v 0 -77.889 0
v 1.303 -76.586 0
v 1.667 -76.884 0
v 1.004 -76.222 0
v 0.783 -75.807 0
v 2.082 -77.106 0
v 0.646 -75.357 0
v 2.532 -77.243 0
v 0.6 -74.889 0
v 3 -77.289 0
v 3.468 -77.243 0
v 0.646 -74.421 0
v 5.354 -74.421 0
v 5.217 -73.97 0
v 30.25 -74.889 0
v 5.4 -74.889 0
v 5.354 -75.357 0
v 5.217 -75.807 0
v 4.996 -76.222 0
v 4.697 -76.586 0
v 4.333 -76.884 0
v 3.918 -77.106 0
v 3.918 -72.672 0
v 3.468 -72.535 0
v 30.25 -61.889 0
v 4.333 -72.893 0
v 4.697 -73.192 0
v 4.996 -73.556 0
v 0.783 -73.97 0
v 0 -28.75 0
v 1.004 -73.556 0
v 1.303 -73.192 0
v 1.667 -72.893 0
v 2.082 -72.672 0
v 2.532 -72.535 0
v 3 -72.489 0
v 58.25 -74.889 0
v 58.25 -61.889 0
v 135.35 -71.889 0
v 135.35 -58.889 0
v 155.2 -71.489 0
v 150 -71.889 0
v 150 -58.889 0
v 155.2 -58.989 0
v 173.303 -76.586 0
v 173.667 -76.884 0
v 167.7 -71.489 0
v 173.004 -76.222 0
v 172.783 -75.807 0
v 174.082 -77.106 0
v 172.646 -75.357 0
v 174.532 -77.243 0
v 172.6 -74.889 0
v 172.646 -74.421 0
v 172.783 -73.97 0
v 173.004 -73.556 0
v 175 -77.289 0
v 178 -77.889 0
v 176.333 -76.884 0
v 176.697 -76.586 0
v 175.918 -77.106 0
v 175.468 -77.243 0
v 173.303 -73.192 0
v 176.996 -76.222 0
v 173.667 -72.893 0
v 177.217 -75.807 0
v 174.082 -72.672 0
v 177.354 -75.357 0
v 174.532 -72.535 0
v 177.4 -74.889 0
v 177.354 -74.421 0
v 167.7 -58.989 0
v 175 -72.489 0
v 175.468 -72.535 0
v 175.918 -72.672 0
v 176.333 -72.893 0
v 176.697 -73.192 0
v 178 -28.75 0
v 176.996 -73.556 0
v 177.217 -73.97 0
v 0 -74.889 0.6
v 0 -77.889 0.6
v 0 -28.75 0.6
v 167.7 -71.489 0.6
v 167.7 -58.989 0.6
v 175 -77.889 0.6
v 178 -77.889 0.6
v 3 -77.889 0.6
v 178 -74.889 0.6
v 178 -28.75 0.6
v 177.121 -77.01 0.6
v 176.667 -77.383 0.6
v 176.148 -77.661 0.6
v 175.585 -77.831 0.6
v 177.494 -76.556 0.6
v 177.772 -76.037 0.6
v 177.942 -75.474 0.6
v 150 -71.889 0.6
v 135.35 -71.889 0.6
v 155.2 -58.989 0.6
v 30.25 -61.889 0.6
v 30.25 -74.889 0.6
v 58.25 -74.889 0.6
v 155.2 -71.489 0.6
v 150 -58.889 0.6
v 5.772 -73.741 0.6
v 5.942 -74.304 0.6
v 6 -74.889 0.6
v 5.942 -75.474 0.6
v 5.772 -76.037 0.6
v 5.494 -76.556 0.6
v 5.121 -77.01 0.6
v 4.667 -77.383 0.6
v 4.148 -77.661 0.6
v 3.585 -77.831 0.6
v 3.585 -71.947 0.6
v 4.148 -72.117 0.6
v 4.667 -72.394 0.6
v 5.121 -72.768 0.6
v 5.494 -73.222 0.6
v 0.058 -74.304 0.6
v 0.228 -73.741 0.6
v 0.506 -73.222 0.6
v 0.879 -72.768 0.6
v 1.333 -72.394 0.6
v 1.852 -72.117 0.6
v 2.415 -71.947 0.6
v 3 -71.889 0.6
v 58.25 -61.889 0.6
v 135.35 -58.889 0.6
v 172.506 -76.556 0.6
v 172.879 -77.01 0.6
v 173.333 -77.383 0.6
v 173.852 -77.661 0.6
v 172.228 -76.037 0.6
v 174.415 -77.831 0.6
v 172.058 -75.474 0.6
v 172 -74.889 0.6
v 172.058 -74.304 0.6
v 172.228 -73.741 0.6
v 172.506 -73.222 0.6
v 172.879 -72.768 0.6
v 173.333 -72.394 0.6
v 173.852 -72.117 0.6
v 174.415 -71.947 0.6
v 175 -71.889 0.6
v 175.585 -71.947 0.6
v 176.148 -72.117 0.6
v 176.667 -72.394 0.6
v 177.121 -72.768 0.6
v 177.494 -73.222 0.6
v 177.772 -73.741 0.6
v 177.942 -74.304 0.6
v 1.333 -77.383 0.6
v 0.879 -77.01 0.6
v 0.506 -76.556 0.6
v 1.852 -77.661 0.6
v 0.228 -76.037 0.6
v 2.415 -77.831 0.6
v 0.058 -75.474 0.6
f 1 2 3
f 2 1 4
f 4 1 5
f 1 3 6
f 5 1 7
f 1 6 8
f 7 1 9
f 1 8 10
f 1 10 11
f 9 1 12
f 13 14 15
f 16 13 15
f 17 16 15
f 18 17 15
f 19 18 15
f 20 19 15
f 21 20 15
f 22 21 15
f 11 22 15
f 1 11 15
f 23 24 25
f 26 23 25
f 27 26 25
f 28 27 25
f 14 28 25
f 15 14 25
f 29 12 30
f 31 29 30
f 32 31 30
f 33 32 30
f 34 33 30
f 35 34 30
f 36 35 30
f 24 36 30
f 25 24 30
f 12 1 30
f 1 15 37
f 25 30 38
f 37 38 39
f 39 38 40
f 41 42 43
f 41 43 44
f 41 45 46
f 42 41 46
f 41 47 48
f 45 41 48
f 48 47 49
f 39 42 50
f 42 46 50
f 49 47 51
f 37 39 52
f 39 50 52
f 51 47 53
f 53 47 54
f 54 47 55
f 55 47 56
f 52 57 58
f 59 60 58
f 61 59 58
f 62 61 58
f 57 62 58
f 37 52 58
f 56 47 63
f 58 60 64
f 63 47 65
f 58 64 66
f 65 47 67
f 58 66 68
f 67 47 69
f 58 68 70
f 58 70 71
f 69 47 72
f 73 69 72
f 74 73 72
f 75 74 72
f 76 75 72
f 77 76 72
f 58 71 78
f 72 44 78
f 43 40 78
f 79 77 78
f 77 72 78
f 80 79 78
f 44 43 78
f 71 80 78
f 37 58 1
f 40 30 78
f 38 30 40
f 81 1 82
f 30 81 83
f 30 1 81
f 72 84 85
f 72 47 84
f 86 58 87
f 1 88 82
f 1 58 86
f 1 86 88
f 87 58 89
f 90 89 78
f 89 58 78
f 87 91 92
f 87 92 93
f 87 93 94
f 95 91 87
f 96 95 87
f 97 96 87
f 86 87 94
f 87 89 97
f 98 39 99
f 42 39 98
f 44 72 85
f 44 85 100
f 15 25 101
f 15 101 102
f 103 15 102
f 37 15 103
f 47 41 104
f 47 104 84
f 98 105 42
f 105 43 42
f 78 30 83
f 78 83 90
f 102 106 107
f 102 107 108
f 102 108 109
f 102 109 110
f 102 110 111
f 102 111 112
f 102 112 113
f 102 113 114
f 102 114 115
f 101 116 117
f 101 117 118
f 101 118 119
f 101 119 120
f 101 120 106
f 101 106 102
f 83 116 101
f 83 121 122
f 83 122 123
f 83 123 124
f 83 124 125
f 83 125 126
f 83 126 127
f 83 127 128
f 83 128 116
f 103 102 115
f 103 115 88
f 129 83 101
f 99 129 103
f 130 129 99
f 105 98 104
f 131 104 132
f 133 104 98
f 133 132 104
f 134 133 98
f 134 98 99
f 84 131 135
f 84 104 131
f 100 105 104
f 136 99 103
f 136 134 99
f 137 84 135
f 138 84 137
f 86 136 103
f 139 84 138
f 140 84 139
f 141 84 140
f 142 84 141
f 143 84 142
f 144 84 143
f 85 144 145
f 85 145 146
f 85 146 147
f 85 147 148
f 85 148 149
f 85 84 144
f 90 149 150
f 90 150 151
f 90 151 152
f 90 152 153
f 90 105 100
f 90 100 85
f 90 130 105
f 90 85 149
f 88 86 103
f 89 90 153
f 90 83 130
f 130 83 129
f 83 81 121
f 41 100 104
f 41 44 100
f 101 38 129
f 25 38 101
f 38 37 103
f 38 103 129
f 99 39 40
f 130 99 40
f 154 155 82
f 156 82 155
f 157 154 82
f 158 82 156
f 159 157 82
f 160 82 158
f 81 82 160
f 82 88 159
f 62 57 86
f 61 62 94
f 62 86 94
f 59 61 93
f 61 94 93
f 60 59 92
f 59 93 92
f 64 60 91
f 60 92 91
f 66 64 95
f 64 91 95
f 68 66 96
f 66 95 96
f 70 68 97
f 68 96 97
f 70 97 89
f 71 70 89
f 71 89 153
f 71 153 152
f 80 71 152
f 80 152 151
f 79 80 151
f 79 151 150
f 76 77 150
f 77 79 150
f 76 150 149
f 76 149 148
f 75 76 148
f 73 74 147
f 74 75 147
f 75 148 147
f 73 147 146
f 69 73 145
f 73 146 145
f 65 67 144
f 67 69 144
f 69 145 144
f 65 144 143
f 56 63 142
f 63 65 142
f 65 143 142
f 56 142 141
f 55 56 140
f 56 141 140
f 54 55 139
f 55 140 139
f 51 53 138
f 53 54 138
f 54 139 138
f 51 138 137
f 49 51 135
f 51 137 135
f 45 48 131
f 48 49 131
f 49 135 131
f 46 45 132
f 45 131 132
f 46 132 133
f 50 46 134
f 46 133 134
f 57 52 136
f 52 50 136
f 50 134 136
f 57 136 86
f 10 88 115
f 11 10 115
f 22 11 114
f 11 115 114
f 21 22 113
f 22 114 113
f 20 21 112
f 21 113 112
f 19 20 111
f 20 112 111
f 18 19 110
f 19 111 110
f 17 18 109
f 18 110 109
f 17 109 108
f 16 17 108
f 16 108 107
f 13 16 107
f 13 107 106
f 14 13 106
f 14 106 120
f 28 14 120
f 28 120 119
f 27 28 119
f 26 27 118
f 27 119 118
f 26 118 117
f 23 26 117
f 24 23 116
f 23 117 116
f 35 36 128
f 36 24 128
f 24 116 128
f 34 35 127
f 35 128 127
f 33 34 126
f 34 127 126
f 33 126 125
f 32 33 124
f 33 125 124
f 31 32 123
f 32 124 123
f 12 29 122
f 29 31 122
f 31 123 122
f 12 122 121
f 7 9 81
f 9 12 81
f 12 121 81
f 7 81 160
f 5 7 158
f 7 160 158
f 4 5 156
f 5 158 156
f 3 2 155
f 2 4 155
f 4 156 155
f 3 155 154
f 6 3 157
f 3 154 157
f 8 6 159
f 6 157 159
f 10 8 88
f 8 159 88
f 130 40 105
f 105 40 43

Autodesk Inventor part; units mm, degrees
ref_plane "YZ Plane" through (0, 0, 0) normal (1, 0, 0) x (0, 1, 0)
ref_plane "XZ Plane" through (0, 0, 0) normal (0, 1, 0) x (-1, 0, 0)
ref_plane "XY Plane" through (0, 0, 0) normal (0, 0, 1) x (1, 0, 0)
ref_plane "Work Plane1" through (0, 0, 0) normal (0, 0, 1) x (1, 0, 0)
sketch "Sketch1" plane through (0, 0, 0) normal (0, 0, 1) x (1, 0, 0)
  line L0 (84.5, 12.4325) -> (84.5, -11.5675) projected
  line L1 (84.5, -11.5675) -> (72.5, -11.5675) projected
  line L2 (72.5, -11.5675) -> (72.5, 4.5875) projected
  circle A0 centre (69.5, 4.5875) radius 3 projected
  line L3 (72.5, 4.5875) -> (72.5, 12.4325) projected
  line L4 (72.5, 12.4325) -> (84.5, 12.4325) projected
  arc A1 (105.5, 4.2836) -> (105.5, 4.8914) centre (108.4846, 4.5875) ccw projected
  line L5 (105.5, 4.2836) -> (105.5, -11.5675) projected
  line L6 (105.5, -11.5675) -> (93.5, -11.5675) projected
  line L7 (93.5, -11.5675) -> (93.5, 12.4325) projected
  line L8 (93.5, 12.4325) -> (105.5, 12.4325) projected
  line L9 (105.5, 12.4325) -> (105.5, 4.8914) projected
  circle A2 centre (108.4462, 27.5) radius 3 projected
  circle A3 centre (69.5, 27.5) radius 3 projected
  circle A4 centre (89, 0.9661) radius 3 projected
  circle A5 centre (89, 29.5) radius 3 projected
  arc A6 (175, 0) -> (178, -3) centre (175, -3) ccw projected
  line L10 (175, 0) -> (115.0397, 0) projected
  line L11 (65.5, 33.8) -> (65.5, 0) projected
  line L12 (65.5, 0) -> (65.1397, 0) projected
  arc A7 (0, -3) -> (3, 0) centre (3, -3) ccw projected
  line L13 (0, -3) -> (0, -25.75) projected
  arc A8 (3, -28.75) -> (0, -25.75) centre (3, -25.75) ccw projected
  line L14 (3, -28.75) -> (62.9603, -28.75) projected
  arc A9 (178, -25.75) -> (175, -28.75) centre (175, -25.75) ccw projected
  line L15 (178, -25.75) -> (178, -3) projected
  circle A10 centre (3, -25.75) radius 2.3 projected
  circle A11 centre (3, -3) radius 2.3 projected
  circle A12 centre (3, -74.8889) radius 2.3 projected
  line L16 (0, 0) -> (6, 0) projected
  line L17 (0, -77.8889) -> (0, 0) projected
  line L18 (0, -77.8889) -> (6, -77.8889) projected
  line L19 (6, -71.8889) -> (6, -77.8889) projected
  line L20 (6, -71.8889) -> (1.6, -71.8889) projected
  line L21 (1.6, -71.8889) -> (1.6, -56.7889) projected
  line L22 (1.6, -56.7889) -> (3, -56.7889) projected
  line L23 (3, -28.75) -> (3, -56.7889) projected
  line L24 (3, -28.75) -> (6, -28.75) projected
  line L25 (6, -28.75) -> (6, -22.75) projected
  line L26 (6, -22.75) -> (3, -22.75) projected
  line L27 (3, -6) -> (3, -22.75) projected
  line L28 (3, -6) -> (6, -6) projected
  line L29 (6, -6) -> (6, 0) projected
  circle A13 centre (175, -3) radius 2.3 projected
  circle A14 centre (175, -25.75) radius 2.3 projected
  line L30 (175, -28.75) -> (175, -71.8889) projected
  line L31 (175, -6) -> (175, -22.75) projected
  line L32 (175, -71.8889) -> (172, -71.8889) projected
  line L33 (172, -71.8889) -> (172, -77.8889) projected
  line L34 (178, -77.8889) -> (172, -77.8889) projected
  line L35 (178, -77.8889) -> (178, 0) projected
  line L36 (178, 0) -> (172, 0) projected
  line L37 (172, 0) -> (172, -6) projected
  line L38 (172, -6) -> (175, -6) projected
  line L39 (175, -22.75) -> (172, -22.75) projected
  line L40 (172, -22.75) -> (172, -28.75) projected
  line L41 (172, -28.75) -> (175, -28.75) projected
  circle A15 centre (175, -74.8889) radius 2.3 projected
  line L42 (156.2, -70.4889) -> (156.2, -59.9889) projected
  line L43 (166.7, -59.9889) -> (156.2, -59.9889) projected
  line L44 (166.7, -59.9889) -> (166.7, -70.4889) projected
  line L45 (156.2, -70.4889) -> (166.7, -70.4889) projected
  line L46 (149, -59.8889) -> (149, -70.8889) projected
  line L47 (149, -70.8889) -> (136.35, -70.8889) projected
  line L48 (136.35, -70.8889) -> (136.35, -59.8889) projected
  line L49 (136.35, -59.8889) -> (149, -59.8889) projected
  line L50 (135, -53.8889) -> (135, -71.8889) projected
  line L51 (135, -71.8889) -> (175, -71.8889) projected
  line L52 (175, -71.8889) -> (175, -53.8889) projected
  line L53 (175, -53.8889) -> (135, -53.8889) projected
  circle A16 centre (137.85, -56.7389) radius 1.5 projected
  circle A17 centre (172.15, -56.7389) radius 1.5 projected
  line L54 (31.25, -62.8889) -> (31.25, -73.8889) projected
  line L55 (31.25, -73.8889) -> (57.25, -73.8889) projected
  line L56 (57.25, -73.8889) -> (57.25, -62.8889) projected
  line L57 (57.25, -62.8889) -> (31.25, -62.8889) projected
  line L58 (3, -56.7889) -> (23.3, -56.7889) projected
  line L59 (23.3, -56.7889) -> (23.3, -59.8889) projected
  line L60 (23.3, -59.8889) -> (23.3, -65.1889) projected
  line L61 (3, -71.8889) -> (23.3, -71.8889) projected
  line L62 (23.3, -61.8889) -> (23.3, -74.8889) projected
  line L63 (30.25, -61.8889) -> (30.25, -74.8889)
  line L64 (30.25, -74.8889) -> (58.25, -74.8889)
  line L65 (58.25, -74.8889) -> (58.25, -61.8889)
  line L66 (58.25, -61.8889) -> (30.25, -61.8889)
  line L67 (150, -58.8889) -> (150, -71.8889)
  line L68 (150, -71.8889) -> (135.35, -71.8889)
  line L69 (135.35, -71.8889) -> (135.35, -58.8889)
  line L70 (135.35, -58.8889) -> (150, -58.8889)
  line L71 (155.2, -58.9889) -> (155.2, -71.4889)
  line L72 (155.2, -71.4889) -> (167.7, -71.4889)
  line L73 (167.7, -71.4889) -> (167.7, -58.9889)
  line L74 (167.7, -58.9889) -> (155.2, -58.9889)
  line L75 (0, -28.75) -> (178, -28.75)
  line L76 (178, -28.75) -> (178, -77.8889)
  line L77 (178, -77.8889) -> (0, -77.8889)
  line L78 (0, -77.8889) -> (0, -28.75)
  line L79 (131.125, -21.1625) -> (131.125, -7.525) projected
  arc A18 (134.125, -4.525) -> (131.125, -7.525) centre (134.125, -7.525) ccw projected
  line L80 (134.125, -4.525) -> (155.95, -4.525) projected
  arc A19 (158.95, -7.525) -> (155.95, -4.525) centre (155.95, -7.525) ccw projected
  line L81 (158.95, -7.525) -> (158.95, -21.1625) projected
  arc A20 (155.95, -24.1625) -> (158.95, -21.1625) centre (155.95, -21.1625) ccw projected
  line L82 (155.95, -24.1625) -> (134.125, -24.1625) projected
  arc A21 (131.125, -21.1625) -> (134.125, -24.1625) centre (134.125, -21.1625) ccw projected
  line L83 (46.875, -7.5875) -> (46.875, -21.225) projected
  arc A22 (43.875, -24.225) -> (46.875, -21.225) centre (43.875, -21.225) ccw projected
  line L84 (43.875, -24.225) -> (22.05, -24.225) projected
  arc A23 (19.05, -21.225) -> (22.05, -24.225) centre (22.05, -21.225) ccw projected
  line L85 (19.05, -21.225) -> (19.05, -7.5875) projected
  arc A24 (22.05, -4.5875) -> (19.05, -7.5875) centre (22.05, -7.5875) ccw projected
  line L86 (22.05, -4.5875) -> (43.875, -4.5875) projected
  arc A25 (46.875, -7.5875) -> (43.875, -4.5875) centre (43.875, -7.5875) ccw projected
  line L87 (112.5, 0) -> (112.5, 33.8) projected
  line L88 (112.5, 33.8) -> (65.5, 33.8) projected
  arc A26 (115.0397, -28.75) -> (112.8603, -28.75) centre (113.95, -26.5) ccw projected
  line L89 (115.0397, -28.75) -> (175, -28.75) projected
  arc A27 (112.8603, 0) -> (115.0397, 0) centre (113.95, -2.25) ccw projected
  line L90 (112.8603, 0) -> (112.5, 0) projected
  arc A28 (62.9603, 0) -> (65.1397, 0) centre (64.05, -2.25) ccw projected
  line L91 (62.9603, 0) -> (3, 0) projected
  arc A29 (65.1397, -28.75) -> (62.9603, -28.75) centre (64.05, -26.5) ccw projected
  line L92 (65.1397, -28.75) -> (112.8603, -28.75) projected
  point P0 (168.4, -53.8889)
  point P1 (135.35, -71.8889)
  point P2 (6, -25.75)
  point P3 (3, -28.75)
  dimension "d0" = 1
  dimension "d1" = 1
  dimension "d2" = 1
extrude "Extrusion1" add sketch "Sketch1" along normal blind 0.6 contours L35 L34 L33 L32 L30 L75 | L30 L53 L50 L51 L33 L77 L19 L61 L62 L60 L59 L58 L23 L14 L75 L41 | L30 L32 L51 L67 L70 L69 L50 L53 | L18 L17 L75 L23 L22 L21 L20 L19 | L20 L21 L22 L58 L59 L60 L62 L61 | A12 | A15 | A16 | A17
sketch "Sketch2" plane through (0, 0, 0.6) normal (0, 0, 1) x (1, 0, 0)
  circle A0 centre (3, -25.75) radius 2.3 projected
  circle A1 centre (3, -3) radius 2.3 projected
  circle A2 centre (3, -74.8889) radius 2.3 projected
  line L0 (0, 0) -> (6, 0) projected
  line L1 (0, -77.8889) -> (0, 0) projected
  line L2 (0, -77.8889) -> (6, -77.8889) projected
  line L3 (6, -71.8889) -> (6, -77.8889) projected
  line L4 (6, -71.8889) -> (1.6, -71.8889) projected
  line L5 (1.6, -71.8889) -> (1.6, -56.7889) projected
  line L6 (1.6, -56.7889) -> (3, -56.7889) projected
  line L7 (3, -28.75) -> (3, -56.7889) projected
  line L8 (3, -28.75) -> (6, -28.75) projected
  line L9 (6, -28.75) -> (6, -22.75) projected
  line L10 (6, -22.75) -> (3, -22.75) projected
  line L11 (3, -6) -> (3, -22.75) projected
  line L12 (3, -6) -> (6, -6) projected
  line L13 (6, -6) -> (6, 0) projected
  circle A3 centre (175, -3) radius 2.3 projected
  circle A4 centre (175, -25.75) radius 2.3 projected
  line L14 (175, -28.75) -> (175, -71.8889) projected
  line L15 (175, -6) -> (175, -22.75) projected
  line L16 (175, -71.8889) -> (172, -71.8889) projected
  line L17 (172, -71.8889) -> (172, -77.8889) projected
  line L18 (178, -77.8889) -> (172, -77.8889) projected
  line L19 (178, -77.8889) -> (178, 0) projected
  line L20 (178, 0) -> (172, 0) projected
  line L21 (172, 0) -> (172, -6) projected
  line L22 (172, -6) -> (175, -6) projected
  line L23 (175, -22.75) -> (172, -22.75) projected
  line L24 (172, -22.75) -> (172, -28.75) projected
  line L25 (172, -28.75) -> (175, -28.75) projected
  circle A5 centre (175, -74.8889) radius 2.3 projected
hole "Hole1" at (3, -74.8889, 0.6) at (175, -74.8889, 0.6) direction (0, 0, -1) diameter 3.6 end through all countersink diameter 6 countersink angle 90 clearance for "Countersunk Flat Head Screw ISO 2009/7046" size "M3" standard "ISO"
properties part number "ceil_front" material "ABS Plastic"
